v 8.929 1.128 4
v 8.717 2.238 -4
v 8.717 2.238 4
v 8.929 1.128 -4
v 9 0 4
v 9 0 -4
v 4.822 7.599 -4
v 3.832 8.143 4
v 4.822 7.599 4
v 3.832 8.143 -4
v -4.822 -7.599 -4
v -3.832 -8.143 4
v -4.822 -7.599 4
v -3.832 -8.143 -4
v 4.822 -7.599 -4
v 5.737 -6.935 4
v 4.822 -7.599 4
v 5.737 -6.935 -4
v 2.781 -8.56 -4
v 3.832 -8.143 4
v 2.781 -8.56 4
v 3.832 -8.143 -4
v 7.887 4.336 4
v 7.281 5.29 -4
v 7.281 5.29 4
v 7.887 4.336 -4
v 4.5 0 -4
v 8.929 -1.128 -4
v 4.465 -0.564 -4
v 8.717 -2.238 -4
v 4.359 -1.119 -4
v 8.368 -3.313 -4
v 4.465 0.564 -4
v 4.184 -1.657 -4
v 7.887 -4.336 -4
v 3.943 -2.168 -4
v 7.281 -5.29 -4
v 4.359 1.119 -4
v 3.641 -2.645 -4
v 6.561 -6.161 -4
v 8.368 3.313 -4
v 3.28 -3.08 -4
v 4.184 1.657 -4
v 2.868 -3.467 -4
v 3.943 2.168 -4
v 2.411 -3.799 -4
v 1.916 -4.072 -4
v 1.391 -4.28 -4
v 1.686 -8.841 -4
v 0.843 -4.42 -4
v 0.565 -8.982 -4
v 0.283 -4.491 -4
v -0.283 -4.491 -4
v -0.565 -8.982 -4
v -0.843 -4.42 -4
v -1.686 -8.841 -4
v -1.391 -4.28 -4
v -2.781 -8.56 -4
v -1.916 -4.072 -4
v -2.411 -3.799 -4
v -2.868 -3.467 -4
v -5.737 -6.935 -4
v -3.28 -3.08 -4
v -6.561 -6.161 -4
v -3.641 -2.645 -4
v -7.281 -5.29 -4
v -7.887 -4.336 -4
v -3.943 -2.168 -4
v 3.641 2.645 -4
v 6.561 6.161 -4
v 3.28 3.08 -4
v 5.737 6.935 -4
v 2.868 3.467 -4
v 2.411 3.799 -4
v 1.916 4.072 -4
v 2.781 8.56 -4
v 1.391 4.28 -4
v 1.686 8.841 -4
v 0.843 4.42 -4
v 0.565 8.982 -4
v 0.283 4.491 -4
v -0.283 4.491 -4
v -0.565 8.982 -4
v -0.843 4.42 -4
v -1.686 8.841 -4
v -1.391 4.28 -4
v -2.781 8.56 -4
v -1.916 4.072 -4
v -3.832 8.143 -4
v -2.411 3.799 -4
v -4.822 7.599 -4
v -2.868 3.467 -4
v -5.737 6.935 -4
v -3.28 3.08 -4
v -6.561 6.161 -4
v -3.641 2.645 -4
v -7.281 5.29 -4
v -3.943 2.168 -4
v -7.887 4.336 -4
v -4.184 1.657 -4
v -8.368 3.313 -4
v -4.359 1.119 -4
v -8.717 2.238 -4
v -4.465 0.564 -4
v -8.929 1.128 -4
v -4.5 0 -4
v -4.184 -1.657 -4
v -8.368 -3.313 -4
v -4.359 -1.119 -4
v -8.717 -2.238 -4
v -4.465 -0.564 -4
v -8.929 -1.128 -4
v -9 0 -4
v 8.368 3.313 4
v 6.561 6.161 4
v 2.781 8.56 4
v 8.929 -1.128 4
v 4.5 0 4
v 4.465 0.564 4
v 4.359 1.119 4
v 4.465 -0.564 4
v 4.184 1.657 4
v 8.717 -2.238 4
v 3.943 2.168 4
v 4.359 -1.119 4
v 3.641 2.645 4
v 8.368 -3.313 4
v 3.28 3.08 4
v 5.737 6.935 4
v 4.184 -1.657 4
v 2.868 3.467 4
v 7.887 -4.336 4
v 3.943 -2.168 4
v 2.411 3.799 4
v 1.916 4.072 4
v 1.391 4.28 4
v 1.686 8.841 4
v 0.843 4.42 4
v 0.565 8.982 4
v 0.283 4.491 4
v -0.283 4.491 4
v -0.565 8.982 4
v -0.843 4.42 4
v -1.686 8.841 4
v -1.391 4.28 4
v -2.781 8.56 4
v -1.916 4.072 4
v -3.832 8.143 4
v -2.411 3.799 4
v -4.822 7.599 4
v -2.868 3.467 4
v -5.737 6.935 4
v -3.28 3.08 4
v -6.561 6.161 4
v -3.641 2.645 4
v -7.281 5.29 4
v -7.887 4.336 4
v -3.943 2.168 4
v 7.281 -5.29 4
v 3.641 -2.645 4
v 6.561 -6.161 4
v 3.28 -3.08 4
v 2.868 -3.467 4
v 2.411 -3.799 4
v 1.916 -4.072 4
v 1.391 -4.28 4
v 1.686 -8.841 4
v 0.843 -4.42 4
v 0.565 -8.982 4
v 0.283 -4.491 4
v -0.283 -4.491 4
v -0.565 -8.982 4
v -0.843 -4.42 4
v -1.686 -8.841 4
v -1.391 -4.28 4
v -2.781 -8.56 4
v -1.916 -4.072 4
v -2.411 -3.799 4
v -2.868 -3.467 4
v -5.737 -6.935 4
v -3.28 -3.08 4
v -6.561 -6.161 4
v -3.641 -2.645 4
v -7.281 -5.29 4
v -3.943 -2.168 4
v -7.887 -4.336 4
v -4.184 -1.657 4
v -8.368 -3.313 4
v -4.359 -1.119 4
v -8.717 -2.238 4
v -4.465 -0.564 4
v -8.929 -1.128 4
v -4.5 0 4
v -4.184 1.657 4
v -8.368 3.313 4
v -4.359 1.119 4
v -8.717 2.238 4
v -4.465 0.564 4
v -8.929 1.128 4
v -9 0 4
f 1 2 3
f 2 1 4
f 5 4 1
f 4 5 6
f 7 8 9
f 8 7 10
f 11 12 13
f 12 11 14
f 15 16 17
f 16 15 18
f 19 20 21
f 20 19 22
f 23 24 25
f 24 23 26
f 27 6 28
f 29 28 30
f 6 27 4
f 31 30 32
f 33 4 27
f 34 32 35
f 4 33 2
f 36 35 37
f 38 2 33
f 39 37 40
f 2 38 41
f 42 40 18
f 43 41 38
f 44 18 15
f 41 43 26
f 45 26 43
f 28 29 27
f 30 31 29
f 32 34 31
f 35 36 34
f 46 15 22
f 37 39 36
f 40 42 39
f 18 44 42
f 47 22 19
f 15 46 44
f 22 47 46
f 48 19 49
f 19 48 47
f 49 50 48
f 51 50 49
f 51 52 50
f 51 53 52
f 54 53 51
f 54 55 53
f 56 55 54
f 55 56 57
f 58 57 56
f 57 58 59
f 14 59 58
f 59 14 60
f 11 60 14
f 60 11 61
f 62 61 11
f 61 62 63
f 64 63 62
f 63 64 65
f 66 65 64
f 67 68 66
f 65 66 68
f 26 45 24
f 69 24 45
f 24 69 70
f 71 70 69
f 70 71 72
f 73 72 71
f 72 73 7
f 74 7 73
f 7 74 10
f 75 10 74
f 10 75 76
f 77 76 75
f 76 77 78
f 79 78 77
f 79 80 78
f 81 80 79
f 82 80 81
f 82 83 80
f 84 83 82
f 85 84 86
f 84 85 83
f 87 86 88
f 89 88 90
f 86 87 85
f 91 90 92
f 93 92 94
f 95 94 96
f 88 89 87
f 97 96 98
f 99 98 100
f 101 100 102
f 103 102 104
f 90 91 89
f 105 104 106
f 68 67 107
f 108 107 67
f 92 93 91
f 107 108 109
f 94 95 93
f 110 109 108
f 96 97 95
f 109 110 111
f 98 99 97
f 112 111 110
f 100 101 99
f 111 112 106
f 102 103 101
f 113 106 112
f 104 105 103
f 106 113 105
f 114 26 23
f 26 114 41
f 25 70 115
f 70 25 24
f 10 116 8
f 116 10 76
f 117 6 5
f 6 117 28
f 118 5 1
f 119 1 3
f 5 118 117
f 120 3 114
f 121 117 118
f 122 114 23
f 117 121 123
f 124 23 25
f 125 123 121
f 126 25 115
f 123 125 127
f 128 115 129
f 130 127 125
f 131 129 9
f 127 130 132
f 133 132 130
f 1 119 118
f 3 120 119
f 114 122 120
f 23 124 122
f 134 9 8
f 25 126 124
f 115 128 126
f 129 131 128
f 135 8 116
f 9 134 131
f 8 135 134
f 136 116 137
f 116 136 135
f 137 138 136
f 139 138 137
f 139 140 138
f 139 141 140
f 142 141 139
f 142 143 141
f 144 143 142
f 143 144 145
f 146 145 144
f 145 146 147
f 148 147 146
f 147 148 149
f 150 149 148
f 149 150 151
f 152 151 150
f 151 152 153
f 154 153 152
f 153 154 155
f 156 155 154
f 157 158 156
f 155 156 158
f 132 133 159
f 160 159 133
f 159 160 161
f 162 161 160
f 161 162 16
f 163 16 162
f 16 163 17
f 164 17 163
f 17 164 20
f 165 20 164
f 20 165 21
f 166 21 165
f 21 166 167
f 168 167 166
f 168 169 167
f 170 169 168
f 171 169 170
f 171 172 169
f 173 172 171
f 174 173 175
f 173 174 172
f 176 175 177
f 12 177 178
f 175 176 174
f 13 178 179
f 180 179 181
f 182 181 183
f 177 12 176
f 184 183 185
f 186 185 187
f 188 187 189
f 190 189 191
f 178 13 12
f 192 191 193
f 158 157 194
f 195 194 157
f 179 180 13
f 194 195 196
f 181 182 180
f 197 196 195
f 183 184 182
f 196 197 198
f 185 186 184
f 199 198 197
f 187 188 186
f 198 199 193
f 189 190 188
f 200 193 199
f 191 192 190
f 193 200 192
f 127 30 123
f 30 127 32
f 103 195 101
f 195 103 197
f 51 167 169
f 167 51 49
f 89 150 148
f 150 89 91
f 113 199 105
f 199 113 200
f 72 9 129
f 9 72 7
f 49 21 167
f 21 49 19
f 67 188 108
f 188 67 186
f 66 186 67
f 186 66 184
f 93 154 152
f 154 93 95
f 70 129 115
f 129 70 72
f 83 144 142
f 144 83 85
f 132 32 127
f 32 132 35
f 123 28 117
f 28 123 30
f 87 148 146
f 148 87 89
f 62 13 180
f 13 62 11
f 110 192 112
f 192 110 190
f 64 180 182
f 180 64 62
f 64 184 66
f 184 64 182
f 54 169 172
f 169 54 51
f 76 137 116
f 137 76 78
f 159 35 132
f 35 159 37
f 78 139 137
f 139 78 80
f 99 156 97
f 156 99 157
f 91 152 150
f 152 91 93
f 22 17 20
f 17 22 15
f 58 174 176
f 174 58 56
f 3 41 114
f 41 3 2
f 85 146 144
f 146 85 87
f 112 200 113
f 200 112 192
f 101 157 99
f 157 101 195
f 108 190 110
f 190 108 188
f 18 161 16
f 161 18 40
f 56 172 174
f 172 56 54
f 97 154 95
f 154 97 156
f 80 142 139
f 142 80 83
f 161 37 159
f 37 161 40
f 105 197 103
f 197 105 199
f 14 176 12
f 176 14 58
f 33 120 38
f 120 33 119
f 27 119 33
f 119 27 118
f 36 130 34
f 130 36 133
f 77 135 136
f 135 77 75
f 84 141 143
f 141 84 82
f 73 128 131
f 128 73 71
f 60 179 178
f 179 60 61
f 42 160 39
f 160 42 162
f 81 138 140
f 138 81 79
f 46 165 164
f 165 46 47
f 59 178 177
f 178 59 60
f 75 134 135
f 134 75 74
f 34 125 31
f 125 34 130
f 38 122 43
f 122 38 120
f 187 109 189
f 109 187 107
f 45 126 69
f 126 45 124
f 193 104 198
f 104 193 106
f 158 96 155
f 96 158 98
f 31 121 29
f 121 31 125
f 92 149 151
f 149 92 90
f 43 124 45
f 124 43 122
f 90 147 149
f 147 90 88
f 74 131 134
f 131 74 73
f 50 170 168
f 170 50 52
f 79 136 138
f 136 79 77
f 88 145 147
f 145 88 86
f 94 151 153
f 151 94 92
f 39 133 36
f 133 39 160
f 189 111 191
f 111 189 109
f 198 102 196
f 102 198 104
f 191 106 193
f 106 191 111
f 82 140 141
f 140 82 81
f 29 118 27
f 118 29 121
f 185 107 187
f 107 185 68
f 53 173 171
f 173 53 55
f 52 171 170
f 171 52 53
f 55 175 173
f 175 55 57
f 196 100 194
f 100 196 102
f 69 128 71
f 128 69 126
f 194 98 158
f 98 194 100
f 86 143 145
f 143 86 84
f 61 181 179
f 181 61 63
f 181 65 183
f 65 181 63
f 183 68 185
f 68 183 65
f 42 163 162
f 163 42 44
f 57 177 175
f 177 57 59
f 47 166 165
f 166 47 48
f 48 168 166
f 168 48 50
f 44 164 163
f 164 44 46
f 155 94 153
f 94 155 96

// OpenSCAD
$fn = 50;


difference() {
	union() {
		translate(v = [0, 0, -4.0000000000]) {
			cylinder(h = 8, r = 9.0000000000);
		}
	}
	union() {
		translate(v = [0, 0, -100.0000000000]) {
			cylinder(h = 200, r = 4.5000000000);
		}
	}
}
